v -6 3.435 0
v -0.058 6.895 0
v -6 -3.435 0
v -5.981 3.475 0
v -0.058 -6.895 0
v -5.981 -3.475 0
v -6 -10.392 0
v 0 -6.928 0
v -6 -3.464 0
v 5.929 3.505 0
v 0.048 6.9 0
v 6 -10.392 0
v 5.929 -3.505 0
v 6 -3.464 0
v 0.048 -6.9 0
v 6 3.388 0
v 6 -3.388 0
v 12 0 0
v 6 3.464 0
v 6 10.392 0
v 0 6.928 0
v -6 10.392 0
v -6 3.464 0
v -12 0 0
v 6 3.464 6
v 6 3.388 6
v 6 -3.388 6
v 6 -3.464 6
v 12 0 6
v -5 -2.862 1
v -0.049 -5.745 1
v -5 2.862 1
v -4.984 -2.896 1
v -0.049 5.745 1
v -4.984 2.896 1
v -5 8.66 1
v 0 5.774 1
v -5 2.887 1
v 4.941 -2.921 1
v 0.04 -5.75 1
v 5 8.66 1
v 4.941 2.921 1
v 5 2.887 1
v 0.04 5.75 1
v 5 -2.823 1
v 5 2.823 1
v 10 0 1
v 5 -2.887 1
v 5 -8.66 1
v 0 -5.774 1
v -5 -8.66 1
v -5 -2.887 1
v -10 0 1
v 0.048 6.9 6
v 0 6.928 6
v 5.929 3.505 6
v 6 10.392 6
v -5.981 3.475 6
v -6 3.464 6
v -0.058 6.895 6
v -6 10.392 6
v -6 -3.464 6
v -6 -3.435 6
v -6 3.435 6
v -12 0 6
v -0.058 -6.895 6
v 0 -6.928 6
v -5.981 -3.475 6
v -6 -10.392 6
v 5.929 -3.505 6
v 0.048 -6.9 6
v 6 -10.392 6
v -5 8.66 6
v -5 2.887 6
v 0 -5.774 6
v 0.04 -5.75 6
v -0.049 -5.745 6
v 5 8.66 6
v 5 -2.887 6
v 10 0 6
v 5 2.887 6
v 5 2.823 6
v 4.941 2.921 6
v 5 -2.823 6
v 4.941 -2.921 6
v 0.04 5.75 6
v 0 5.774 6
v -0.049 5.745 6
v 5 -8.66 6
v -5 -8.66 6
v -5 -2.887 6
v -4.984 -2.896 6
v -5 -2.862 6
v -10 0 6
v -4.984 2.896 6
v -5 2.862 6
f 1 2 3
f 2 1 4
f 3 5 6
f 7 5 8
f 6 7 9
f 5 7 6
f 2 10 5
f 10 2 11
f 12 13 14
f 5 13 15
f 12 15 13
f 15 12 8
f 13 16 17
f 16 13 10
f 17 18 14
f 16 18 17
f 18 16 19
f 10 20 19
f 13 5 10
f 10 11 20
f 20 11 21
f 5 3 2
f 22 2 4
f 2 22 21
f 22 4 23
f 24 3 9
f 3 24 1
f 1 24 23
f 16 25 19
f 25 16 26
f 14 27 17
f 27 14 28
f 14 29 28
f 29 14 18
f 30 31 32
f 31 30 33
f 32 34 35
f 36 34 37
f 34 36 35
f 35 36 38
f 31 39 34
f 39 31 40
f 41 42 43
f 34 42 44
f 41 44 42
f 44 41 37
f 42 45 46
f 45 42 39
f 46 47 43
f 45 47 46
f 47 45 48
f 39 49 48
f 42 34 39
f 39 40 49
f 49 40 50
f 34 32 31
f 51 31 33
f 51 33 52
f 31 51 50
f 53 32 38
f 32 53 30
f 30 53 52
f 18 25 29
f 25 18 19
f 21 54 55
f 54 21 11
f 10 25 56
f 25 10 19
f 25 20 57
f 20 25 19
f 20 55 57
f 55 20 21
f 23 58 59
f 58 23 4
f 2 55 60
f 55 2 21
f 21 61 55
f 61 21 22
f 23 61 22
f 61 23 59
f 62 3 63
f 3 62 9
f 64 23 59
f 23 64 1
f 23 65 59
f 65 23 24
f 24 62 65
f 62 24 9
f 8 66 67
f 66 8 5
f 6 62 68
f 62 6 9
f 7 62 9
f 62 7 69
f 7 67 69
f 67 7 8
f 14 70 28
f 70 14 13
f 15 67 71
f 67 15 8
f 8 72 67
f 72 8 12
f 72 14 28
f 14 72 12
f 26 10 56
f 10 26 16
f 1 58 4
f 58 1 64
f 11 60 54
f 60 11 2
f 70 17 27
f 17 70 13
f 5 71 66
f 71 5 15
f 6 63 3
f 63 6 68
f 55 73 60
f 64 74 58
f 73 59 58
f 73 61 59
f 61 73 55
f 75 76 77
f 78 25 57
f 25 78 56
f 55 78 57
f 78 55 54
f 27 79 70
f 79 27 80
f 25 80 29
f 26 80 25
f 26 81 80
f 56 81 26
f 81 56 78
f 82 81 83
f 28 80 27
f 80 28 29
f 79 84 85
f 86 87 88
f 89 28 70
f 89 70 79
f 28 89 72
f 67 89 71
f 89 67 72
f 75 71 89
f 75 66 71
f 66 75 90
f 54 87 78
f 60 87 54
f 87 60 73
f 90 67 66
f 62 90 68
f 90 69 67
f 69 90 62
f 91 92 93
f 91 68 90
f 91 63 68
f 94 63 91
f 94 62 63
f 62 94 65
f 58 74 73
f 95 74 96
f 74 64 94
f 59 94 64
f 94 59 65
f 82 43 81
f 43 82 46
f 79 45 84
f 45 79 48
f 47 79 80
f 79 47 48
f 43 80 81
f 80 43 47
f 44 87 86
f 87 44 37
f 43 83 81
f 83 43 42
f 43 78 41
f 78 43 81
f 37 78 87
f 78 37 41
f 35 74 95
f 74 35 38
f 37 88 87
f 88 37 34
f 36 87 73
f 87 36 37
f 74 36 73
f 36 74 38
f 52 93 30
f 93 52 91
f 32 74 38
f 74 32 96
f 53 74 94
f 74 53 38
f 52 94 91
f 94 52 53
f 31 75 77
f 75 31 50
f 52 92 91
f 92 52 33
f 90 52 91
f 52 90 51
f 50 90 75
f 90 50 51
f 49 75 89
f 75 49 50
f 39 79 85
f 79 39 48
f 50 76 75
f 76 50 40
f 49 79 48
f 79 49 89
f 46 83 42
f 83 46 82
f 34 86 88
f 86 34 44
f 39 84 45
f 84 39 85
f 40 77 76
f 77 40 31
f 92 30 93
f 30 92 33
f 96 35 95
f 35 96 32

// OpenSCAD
// file: Star.scad
//very simple point object
module Star_Point(length=5, base=5, h=6) {
    
    linear_extrude(height=h){
        polygon(points=[
            [0     ,  base/2],
            [0     , -base/2],
            [length,  0     ]
        ]);
    } 
    
} //END Star_point


//Helper for Star Determines and sets pointlength if we are making a 'straight'
//  star
function setPl( pointLength, length, straight, ang) =
    (straight)?(length*(1/tan(90-ang)))/((1/tan(ang/2))+(1/tan(90-ang))) : pointLength;
//END setPl


//Creates a star with a given number of points
//Gap if $fn is not properly set
//@straight: will override pointLength to make sure star appears to
// be constructed of connected straight lines
module Star(points=5, pointLength=5, h=6, inscCirc=24, straight=false) {
    
    //Precalc values that define the shape of the star
    lTheta = 180 / points;
    pL     = setPl(pointLength, inscCirc/2, straight, 2*lTheta);
    A      = (inscCirc / 2) - pL;
    radius = A / cos(lTheta);
    B      = 2*radius*sin(lTheta);

    //create a plug for the center of the star
    cylinder(r=radius, h=h);
    
    //create all points
    for(i = [0:points])
        rotate([0,0, 2*i*lTheta])
            translate([A,0,0])
                Star_Point(length=pL, base=B, h=h);

}

$fn=29; //make sure there are no gaps in the center rendering
Star(points=5, pointLength=11, inscCirc=24, straight=false);
// main file
use <./Star.scad>


Star(points=6, h=1, pointLength=6, inscCirc=24);

difference() {
    Star(points=6, pointLength=6, inscCirc=24);
    Star(points=6, pointLength=5, inscCirc=20);
}
